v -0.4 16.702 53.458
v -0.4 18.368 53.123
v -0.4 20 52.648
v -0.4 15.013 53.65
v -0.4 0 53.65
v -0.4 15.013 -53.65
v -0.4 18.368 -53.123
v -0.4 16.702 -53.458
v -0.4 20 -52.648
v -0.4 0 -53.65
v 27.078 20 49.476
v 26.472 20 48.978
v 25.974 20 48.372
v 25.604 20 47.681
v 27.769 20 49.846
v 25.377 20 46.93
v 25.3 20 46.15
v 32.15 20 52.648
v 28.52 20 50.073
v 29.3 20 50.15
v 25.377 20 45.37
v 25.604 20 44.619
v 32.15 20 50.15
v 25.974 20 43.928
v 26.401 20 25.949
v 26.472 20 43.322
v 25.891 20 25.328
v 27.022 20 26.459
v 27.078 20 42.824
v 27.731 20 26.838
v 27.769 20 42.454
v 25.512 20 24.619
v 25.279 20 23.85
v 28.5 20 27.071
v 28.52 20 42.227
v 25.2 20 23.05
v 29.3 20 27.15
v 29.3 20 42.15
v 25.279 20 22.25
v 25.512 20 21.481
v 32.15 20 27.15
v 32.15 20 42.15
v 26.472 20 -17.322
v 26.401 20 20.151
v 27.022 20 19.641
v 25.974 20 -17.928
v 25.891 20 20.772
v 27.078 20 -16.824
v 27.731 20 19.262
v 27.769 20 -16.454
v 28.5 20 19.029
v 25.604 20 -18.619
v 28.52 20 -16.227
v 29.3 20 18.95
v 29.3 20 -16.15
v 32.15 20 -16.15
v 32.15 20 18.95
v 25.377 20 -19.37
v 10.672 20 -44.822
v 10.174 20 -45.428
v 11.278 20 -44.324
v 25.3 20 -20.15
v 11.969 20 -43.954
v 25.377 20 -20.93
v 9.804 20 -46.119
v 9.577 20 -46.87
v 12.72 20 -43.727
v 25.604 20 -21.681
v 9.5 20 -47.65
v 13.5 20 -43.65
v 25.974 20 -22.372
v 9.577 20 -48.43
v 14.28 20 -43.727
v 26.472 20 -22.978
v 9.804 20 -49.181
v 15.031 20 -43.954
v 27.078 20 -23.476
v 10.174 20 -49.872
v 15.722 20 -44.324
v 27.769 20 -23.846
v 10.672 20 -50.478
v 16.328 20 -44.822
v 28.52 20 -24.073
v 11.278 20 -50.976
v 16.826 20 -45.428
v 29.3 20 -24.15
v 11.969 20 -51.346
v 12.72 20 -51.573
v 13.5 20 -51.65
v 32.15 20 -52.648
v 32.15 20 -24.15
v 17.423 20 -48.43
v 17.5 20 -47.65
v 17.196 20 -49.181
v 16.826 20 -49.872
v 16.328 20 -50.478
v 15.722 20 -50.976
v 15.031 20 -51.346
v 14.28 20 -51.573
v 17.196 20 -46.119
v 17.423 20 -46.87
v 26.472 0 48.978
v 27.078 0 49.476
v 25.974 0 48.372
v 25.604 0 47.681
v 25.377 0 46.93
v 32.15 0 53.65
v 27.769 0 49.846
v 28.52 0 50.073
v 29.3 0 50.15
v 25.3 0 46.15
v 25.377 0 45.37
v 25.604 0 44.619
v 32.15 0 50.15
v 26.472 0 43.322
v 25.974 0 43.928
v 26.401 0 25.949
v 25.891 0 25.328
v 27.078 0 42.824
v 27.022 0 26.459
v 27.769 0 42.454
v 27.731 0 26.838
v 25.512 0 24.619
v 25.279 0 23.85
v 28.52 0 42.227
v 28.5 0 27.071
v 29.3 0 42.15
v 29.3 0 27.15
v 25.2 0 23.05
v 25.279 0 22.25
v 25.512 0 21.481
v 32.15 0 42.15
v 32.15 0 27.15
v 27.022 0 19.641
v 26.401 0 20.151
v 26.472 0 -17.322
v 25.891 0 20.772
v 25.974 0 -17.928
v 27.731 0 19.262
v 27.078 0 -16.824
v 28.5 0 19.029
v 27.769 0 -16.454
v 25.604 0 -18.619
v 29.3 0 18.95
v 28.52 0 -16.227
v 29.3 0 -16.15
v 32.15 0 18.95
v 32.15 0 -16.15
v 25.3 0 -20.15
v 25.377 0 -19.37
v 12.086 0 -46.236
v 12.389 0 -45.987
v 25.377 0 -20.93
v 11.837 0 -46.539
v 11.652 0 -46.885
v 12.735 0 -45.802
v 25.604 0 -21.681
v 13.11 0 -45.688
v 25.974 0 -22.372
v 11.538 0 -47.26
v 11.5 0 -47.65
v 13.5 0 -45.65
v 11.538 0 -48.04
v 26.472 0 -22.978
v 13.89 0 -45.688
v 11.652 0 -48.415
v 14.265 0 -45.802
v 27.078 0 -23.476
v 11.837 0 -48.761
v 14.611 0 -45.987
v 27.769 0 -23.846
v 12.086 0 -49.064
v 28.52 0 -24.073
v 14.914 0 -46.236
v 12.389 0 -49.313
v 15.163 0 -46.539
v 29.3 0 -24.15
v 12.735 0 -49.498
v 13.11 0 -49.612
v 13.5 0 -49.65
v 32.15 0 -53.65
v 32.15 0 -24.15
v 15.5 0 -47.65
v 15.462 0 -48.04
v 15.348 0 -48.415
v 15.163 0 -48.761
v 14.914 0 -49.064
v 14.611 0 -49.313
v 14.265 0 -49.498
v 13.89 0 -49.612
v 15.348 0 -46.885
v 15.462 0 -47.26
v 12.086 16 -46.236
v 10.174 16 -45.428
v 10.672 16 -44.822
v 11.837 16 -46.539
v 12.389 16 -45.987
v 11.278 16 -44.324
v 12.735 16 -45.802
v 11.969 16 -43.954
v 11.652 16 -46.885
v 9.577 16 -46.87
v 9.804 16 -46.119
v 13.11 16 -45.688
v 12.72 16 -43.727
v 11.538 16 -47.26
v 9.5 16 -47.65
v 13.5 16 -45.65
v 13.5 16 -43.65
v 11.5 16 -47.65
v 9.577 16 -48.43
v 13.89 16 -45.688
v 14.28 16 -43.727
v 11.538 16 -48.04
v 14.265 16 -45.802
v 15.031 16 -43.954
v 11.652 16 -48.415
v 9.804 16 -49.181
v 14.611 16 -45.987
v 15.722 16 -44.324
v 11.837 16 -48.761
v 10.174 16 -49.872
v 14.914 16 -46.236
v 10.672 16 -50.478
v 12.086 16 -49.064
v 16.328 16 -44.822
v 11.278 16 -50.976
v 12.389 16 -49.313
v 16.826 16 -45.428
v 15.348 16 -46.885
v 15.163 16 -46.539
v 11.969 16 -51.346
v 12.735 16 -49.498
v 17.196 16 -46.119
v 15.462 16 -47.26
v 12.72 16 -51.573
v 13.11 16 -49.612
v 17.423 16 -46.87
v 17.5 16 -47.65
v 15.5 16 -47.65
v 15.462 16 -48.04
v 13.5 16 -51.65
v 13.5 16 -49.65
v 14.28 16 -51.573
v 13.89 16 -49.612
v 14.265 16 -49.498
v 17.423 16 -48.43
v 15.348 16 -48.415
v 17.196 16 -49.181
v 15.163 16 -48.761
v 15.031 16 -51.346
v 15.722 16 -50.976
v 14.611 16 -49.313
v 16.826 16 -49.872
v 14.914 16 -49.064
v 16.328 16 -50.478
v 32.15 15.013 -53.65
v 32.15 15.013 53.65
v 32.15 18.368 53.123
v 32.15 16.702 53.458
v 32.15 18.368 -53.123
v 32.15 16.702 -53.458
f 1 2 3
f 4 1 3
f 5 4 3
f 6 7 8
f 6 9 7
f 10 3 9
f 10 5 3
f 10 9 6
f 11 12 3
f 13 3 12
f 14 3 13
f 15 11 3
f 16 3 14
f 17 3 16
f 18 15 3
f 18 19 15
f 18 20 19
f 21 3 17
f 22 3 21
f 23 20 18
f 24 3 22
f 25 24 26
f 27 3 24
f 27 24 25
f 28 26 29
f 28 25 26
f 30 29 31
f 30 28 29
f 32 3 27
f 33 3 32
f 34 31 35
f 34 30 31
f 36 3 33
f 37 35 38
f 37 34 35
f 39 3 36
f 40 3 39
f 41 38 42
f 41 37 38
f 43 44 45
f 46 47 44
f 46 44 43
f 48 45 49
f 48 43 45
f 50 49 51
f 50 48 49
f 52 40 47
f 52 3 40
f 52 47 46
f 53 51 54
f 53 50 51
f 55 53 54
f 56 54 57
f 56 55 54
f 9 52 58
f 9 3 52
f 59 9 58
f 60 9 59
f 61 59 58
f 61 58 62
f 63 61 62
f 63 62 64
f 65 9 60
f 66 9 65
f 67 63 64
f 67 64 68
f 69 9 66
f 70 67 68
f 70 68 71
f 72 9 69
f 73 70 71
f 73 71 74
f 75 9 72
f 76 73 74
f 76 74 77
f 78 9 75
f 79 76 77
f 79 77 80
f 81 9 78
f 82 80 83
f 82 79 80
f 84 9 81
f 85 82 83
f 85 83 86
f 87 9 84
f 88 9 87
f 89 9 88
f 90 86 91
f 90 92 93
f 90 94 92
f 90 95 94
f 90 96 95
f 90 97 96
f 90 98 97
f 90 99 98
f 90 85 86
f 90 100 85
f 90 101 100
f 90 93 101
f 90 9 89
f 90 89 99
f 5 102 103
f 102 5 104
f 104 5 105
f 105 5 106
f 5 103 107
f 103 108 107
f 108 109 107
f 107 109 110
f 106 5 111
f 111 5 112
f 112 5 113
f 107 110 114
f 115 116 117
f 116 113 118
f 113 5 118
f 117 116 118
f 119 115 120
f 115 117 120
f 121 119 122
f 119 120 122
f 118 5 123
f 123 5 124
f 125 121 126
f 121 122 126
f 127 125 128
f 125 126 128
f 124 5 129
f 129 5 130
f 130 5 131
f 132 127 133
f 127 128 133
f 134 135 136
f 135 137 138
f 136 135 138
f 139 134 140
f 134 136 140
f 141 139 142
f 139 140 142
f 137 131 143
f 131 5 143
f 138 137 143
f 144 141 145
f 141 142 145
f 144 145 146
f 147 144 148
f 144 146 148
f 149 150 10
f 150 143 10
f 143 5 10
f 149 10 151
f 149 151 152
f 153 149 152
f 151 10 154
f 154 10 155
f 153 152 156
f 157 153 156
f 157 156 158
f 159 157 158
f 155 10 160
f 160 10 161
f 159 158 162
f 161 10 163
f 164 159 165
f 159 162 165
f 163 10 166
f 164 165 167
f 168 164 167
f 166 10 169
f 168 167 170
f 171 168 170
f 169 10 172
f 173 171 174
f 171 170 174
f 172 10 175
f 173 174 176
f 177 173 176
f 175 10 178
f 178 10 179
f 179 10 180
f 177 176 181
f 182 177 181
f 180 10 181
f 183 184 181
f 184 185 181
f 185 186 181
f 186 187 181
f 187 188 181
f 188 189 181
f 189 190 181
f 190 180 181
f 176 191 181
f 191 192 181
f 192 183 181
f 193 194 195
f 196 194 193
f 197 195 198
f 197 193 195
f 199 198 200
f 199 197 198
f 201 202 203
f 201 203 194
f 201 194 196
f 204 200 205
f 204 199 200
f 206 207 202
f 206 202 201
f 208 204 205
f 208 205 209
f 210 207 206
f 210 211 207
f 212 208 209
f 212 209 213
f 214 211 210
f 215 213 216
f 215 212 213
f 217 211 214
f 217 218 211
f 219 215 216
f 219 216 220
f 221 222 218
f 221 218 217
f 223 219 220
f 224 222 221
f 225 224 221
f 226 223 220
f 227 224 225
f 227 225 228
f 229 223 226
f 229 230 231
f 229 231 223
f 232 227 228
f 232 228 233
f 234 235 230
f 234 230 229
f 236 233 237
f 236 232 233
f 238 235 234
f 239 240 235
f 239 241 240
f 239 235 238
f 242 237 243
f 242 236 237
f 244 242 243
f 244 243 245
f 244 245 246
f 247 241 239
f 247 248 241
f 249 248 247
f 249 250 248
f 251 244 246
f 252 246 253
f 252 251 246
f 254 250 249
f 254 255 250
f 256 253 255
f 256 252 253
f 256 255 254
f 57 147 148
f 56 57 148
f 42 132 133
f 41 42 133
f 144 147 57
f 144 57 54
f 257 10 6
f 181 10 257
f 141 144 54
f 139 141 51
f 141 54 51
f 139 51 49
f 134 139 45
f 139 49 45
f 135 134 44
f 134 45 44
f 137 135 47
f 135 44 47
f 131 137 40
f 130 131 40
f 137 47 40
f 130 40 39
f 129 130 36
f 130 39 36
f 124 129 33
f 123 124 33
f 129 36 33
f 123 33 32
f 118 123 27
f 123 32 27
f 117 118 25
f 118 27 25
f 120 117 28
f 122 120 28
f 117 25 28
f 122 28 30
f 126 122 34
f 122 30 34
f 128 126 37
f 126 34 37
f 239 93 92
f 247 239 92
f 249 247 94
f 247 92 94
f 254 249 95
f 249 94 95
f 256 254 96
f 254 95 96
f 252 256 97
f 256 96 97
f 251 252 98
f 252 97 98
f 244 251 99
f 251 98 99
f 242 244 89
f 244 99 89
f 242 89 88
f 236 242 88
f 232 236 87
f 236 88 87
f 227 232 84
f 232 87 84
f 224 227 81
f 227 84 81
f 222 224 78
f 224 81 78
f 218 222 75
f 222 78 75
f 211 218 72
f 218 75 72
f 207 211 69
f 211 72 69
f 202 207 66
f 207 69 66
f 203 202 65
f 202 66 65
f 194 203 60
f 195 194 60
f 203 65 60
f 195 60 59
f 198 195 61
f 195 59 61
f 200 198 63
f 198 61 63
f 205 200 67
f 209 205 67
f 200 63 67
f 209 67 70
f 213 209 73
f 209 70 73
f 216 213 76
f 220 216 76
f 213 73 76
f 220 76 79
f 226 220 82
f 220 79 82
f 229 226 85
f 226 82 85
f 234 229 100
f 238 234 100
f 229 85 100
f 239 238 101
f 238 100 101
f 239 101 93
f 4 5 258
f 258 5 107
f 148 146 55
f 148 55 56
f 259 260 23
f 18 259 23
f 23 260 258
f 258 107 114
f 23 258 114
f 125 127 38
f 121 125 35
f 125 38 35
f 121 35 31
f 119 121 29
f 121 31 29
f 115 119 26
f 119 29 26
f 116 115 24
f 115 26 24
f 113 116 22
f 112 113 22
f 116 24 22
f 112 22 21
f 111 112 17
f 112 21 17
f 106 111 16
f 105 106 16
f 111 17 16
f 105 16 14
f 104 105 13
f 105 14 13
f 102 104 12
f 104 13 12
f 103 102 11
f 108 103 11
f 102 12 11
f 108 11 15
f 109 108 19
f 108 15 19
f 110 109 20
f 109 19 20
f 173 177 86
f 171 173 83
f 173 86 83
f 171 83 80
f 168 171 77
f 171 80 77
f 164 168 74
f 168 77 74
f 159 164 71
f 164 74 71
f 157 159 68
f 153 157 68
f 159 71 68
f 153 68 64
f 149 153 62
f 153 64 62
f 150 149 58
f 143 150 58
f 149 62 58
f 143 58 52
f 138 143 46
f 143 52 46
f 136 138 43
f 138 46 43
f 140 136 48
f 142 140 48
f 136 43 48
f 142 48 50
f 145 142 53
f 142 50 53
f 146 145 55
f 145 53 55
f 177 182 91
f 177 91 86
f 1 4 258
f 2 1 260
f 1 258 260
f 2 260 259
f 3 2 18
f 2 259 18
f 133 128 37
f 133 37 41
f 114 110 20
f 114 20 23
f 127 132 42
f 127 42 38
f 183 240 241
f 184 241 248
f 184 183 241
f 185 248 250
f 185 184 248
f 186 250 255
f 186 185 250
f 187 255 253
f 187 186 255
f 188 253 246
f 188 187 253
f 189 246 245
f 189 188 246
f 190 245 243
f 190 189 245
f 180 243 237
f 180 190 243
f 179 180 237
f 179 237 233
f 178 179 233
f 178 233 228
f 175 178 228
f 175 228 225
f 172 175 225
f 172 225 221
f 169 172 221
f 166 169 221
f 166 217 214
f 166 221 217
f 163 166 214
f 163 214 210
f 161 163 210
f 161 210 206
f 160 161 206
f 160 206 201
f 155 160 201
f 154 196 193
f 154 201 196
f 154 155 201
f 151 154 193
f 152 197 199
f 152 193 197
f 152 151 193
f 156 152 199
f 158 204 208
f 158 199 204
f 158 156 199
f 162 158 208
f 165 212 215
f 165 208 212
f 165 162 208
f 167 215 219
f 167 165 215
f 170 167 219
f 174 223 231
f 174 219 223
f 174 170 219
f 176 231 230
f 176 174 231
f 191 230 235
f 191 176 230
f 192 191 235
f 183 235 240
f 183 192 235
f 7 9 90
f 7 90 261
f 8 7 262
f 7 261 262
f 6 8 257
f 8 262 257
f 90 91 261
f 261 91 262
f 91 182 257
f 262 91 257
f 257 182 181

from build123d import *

# Parameters (mm, degrees)
SKETCH1_W               = 32.55
SKETCH1_H               = 107.3
SKETCH1_R               = 2
BOSS_EXTRUDE1_DEPTH     = 20
CUT_EXTRUDE1_DEPTH      = 35
CUT_EXTRUDE1_DEPTH_BACK = 35
CUT_EXTRUDE2_DEPTH      = 35
CUT_EXTRUDE2_DEPTH_BACK = 35
SKETCH4_R               = 4
CUT_EXTRUDE3_DEPTH      = 4
CUT_EXTRUDE4_DEPTH      = 21
CUT_EXTRUDE4_DEPTH_BACK = 21


with BuildPart() as part:
    # Sketch1 → Boss-Extrude1 (new body)
    with BuildSketch(Plane(origin=(0, 0, 0), x_dir=(1, 0, 0), z_dir=(0, 1, 0))):
        with Locations((15.875, 0)):
            Rectangle(SKETCH1_W, SKETCH1_H)
        with Locations((13.5, 47.65)):
            Circle(SKETCH1_R, mode=Mode.SUBTRACT)
    extrude(amount=BOSS_EXTRUDE1_DEPTH)

    # Sketch2 → Cut-Extrude1 (cut, two sides: drawn at the far end of the back side and taken through both)
    with BuildSketch(Plane(origin=(0, 0, 0), x_dir=(0, 0, -1), z_dir=(1, 0, 0)).offset(-CUT_EXTRUDE1_DEPTH_BACK)):
        with BuildLine():
            Line((-53.65, 36.775082183), (-53.65, 15.013329403))
            ThreePointArc((-53.65, 15.013329403), (-47.333294025, 28.233294025), (-33.7, 33.6))
            Line((-33.7, 33.6), (-33.7, 36.775082183))
            Line((-33.7, 36.775082183), (-53.65, 36.775082183))
        make_face()
    extrude(amount=CUT_EXTRUDE1_DEPTH + CUT_EXTRUDE1_DEPTH_BACK, mode=Mode.SUBTRACT)

    # Sketch3 → Cut-Extrude2 (cut, two sides: drawn at the far end of the back side and taken through both)
    with BuildSketch(Plane(origin=(0, 0, 0), x_dir=(0, 0, -1), z_dir=(1, 0, 0)).offset(-CUT_EXTRUDE2_DEPTH_BACK)):
        with BuildLine():
            Line((33.7, 36.775082183), (33.7, 33.6))
            ThreePointArc((33.7, 33.6), (47.333294025, 28.233294025), (53.65, 15.013329403))
            Line((53.65, 15.013329403), (53.65, 36.775082183))
            Line((53.65, 36.775082183), (33.7, 36.775082183))
        make_face()
    extrude(amount=CUT_EXTRUDE2_DEPTH + CUT_EXTRUDE2_DEPTH_BACK, mode=Mode.SUBTRACT)

    # Sketch4 → Cut-Extrude3 (cut)
    with BuildSketch(Plane(origin=(0, 20, 0), x_dir=(1, 0, 0), z_dir=(0, 1, 0))):
        with Locations((13.5, 47.65)):
            Circle(SKETCH4_R)
    extrude(amount=-CUT_EXTRUDE3_DEPTH, mode=Mode.SUBTRACT)

    # Sketch5 → Cut-Extrude4 (cut, two sides: drawn at the far end of the back side and taken through both)
    with BuildSketch(Plane(origin=(0, 20, 0), x_dir=(1, 0, 0), z_dir=(0, 1, 0)).offset(-CUT_EXTRUDE4_DEPTH_BACK)):
        with BuildLine():
            Line((29.3, -27.15), (32.15, -27.15))
            Line((32.15, -27.15), (32.15, -42.15))
            Line((32.15, -42.15), (29.3, -42.15))
            ThreePointArc((29.3, -42.15), (25.3, -46.15), (29.3, -50.15))
            Line((29.3, -50.15), (32.15, -50.15))
            Line((32.15, -50.15), (32.15, -53.65))
            Line((32.15, -53.65), (50, -53.65))
            Line((50, -53.65), (50, 53.65))
            Line((50, 53.65), (32.15, 53.65))
            Line((32.15, 53.65), (32.15, 24.15))
            Line((32.15, 24.15), (29.3, 24.15))
            ThreePointArc((29.3, 24.15), (25.3, 20.15), (29.3, 16.15))
            Line((29.3, 16.15), (32.15, 16.15))
            Line((32.15, 16.15), (32.15, -18.95))
            Line((32.15, -18.95), (29.3, -18.95))
            ThreePointArc((29.3, -18.95), (25.2, -23.05), (29.3, -27.15))
        make_face()
    extrude(amount=CUT_EXTRUDE4_DEPTH + CUT_EXTRUDE4_DEPTH_BACK, mode=Mode.SUBTRACT)


solid = part.part
